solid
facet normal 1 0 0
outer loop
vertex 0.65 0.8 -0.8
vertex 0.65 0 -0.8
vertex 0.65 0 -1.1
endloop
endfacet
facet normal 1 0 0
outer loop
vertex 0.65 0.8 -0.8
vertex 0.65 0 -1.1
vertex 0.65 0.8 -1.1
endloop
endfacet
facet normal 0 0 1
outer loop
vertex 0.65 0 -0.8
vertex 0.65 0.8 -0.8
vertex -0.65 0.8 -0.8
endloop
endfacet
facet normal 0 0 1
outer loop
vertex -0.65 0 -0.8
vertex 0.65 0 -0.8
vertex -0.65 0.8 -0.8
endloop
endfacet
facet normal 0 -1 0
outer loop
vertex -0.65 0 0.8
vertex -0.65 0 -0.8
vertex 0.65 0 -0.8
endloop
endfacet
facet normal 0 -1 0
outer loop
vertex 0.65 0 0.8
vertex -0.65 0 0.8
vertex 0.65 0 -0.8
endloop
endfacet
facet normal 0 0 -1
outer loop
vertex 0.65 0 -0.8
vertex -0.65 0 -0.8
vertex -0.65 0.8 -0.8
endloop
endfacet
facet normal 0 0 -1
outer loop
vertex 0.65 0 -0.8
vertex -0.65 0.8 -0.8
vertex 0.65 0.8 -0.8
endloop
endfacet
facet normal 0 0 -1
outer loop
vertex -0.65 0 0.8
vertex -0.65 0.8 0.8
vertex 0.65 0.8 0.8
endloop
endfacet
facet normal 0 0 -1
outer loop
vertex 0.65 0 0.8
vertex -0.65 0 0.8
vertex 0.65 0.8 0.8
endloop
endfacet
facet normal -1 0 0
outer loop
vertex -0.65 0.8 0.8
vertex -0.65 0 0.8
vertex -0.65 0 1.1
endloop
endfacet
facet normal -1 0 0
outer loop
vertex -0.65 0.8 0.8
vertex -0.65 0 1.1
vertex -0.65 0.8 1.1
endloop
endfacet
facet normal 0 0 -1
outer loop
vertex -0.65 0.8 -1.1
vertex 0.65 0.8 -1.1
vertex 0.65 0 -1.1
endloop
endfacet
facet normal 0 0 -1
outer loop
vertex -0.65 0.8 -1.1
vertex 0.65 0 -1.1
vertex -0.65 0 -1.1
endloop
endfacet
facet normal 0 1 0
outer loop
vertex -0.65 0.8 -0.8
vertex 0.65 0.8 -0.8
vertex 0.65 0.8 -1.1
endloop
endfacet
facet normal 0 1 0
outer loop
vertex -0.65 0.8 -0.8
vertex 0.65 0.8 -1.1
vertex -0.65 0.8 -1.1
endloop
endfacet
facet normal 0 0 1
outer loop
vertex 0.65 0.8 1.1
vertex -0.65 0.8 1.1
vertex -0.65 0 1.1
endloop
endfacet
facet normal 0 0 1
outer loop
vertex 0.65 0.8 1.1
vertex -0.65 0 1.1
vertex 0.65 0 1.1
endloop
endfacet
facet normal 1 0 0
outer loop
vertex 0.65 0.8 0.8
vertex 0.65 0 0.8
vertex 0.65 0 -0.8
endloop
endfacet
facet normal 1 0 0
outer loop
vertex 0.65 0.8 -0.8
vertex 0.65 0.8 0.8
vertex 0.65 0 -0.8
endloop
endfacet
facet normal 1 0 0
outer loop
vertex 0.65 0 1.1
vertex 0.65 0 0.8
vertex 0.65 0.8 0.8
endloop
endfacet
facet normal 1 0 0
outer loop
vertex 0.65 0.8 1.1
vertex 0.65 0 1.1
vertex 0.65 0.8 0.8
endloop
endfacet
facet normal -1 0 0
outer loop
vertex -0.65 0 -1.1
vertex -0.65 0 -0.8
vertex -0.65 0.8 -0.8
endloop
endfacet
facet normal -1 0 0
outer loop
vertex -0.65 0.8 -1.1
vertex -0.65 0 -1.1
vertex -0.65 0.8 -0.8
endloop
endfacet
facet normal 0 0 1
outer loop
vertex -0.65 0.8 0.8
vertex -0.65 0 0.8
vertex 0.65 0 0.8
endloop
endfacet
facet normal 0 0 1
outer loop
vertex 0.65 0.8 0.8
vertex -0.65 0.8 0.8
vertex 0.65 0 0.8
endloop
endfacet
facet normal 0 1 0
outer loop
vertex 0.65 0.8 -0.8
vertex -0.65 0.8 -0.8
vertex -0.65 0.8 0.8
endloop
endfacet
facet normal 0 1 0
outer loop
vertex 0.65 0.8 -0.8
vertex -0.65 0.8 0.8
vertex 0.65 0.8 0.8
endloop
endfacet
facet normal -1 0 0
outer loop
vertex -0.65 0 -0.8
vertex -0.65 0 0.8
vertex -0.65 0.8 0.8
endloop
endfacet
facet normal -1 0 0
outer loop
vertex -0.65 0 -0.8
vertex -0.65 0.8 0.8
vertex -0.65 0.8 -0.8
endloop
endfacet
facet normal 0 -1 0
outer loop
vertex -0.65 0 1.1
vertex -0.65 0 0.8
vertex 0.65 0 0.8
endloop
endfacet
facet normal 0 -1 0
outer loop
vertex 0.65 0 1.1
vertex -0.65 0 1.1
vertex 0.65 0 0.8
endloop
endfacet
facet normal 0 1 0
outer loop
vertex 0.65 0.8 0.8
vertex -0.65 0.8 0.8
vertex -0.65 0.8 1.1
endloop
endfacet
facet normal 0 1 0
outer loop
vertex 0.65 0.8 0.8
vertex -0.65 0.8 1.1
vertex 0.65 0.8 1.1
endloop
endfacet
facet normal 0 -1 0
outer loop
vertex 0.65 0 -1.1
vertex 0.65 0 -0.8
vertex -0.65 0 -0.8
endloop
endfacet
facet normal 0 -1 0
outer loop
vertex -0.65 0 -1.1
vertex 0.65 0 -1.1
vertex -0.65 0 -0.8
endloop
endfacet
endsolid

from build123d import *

# Parameters (mm, degrees)
SKETCH1_W  = 1.3
SKETCH1_H  = 1.6
MB_DEPTH   = 0.8
SKETCH2_W  = 1.3
SKETCH2_H  = 0.8
SB_L_DEPTH = 0.3
SKETCH3_W  = 1.3
SKETCH3_H  = 0.8
SB_R_DEPTH = 0.3


with BuildPart() as part:
    # Sketch1 → MB (new body)
    with BuildSketch(Plane(origin=(0, 0, 0), x_dir=(1, 0, 0), z_dir=(0, 1, 0))):
        Rectangle(SKETCH1_W, SKETCH1_H)
    extrude(amount=MB_DEPTH)


with BuildPart() as body_2:
    # Sketch2 → SB L (new body)
    with BuildSketch(Plane.XY.offset(0.8)):
        with Locations((0, 0.4)):
            Rectangle(SKETCH2_W, SKETCH2_H)
    extrude(amount=SB_L_DEPTH)


with BuildPart() as body_3:
    # Sketch3 → SB R (new body)
    with BuildSketch(Plane(origin=(0, 0, -0.8), x_dir=(-1, 0, 0), z_dir=(0, 0, -1))):
        with Locations((0, 0.4)):
            Rectangle(SKETCH3_W, SKETCH3_H)
    extrude(amount=SB_R_DEPTH)


solid = Compound([part.part, body_2.part, body_3.part])
